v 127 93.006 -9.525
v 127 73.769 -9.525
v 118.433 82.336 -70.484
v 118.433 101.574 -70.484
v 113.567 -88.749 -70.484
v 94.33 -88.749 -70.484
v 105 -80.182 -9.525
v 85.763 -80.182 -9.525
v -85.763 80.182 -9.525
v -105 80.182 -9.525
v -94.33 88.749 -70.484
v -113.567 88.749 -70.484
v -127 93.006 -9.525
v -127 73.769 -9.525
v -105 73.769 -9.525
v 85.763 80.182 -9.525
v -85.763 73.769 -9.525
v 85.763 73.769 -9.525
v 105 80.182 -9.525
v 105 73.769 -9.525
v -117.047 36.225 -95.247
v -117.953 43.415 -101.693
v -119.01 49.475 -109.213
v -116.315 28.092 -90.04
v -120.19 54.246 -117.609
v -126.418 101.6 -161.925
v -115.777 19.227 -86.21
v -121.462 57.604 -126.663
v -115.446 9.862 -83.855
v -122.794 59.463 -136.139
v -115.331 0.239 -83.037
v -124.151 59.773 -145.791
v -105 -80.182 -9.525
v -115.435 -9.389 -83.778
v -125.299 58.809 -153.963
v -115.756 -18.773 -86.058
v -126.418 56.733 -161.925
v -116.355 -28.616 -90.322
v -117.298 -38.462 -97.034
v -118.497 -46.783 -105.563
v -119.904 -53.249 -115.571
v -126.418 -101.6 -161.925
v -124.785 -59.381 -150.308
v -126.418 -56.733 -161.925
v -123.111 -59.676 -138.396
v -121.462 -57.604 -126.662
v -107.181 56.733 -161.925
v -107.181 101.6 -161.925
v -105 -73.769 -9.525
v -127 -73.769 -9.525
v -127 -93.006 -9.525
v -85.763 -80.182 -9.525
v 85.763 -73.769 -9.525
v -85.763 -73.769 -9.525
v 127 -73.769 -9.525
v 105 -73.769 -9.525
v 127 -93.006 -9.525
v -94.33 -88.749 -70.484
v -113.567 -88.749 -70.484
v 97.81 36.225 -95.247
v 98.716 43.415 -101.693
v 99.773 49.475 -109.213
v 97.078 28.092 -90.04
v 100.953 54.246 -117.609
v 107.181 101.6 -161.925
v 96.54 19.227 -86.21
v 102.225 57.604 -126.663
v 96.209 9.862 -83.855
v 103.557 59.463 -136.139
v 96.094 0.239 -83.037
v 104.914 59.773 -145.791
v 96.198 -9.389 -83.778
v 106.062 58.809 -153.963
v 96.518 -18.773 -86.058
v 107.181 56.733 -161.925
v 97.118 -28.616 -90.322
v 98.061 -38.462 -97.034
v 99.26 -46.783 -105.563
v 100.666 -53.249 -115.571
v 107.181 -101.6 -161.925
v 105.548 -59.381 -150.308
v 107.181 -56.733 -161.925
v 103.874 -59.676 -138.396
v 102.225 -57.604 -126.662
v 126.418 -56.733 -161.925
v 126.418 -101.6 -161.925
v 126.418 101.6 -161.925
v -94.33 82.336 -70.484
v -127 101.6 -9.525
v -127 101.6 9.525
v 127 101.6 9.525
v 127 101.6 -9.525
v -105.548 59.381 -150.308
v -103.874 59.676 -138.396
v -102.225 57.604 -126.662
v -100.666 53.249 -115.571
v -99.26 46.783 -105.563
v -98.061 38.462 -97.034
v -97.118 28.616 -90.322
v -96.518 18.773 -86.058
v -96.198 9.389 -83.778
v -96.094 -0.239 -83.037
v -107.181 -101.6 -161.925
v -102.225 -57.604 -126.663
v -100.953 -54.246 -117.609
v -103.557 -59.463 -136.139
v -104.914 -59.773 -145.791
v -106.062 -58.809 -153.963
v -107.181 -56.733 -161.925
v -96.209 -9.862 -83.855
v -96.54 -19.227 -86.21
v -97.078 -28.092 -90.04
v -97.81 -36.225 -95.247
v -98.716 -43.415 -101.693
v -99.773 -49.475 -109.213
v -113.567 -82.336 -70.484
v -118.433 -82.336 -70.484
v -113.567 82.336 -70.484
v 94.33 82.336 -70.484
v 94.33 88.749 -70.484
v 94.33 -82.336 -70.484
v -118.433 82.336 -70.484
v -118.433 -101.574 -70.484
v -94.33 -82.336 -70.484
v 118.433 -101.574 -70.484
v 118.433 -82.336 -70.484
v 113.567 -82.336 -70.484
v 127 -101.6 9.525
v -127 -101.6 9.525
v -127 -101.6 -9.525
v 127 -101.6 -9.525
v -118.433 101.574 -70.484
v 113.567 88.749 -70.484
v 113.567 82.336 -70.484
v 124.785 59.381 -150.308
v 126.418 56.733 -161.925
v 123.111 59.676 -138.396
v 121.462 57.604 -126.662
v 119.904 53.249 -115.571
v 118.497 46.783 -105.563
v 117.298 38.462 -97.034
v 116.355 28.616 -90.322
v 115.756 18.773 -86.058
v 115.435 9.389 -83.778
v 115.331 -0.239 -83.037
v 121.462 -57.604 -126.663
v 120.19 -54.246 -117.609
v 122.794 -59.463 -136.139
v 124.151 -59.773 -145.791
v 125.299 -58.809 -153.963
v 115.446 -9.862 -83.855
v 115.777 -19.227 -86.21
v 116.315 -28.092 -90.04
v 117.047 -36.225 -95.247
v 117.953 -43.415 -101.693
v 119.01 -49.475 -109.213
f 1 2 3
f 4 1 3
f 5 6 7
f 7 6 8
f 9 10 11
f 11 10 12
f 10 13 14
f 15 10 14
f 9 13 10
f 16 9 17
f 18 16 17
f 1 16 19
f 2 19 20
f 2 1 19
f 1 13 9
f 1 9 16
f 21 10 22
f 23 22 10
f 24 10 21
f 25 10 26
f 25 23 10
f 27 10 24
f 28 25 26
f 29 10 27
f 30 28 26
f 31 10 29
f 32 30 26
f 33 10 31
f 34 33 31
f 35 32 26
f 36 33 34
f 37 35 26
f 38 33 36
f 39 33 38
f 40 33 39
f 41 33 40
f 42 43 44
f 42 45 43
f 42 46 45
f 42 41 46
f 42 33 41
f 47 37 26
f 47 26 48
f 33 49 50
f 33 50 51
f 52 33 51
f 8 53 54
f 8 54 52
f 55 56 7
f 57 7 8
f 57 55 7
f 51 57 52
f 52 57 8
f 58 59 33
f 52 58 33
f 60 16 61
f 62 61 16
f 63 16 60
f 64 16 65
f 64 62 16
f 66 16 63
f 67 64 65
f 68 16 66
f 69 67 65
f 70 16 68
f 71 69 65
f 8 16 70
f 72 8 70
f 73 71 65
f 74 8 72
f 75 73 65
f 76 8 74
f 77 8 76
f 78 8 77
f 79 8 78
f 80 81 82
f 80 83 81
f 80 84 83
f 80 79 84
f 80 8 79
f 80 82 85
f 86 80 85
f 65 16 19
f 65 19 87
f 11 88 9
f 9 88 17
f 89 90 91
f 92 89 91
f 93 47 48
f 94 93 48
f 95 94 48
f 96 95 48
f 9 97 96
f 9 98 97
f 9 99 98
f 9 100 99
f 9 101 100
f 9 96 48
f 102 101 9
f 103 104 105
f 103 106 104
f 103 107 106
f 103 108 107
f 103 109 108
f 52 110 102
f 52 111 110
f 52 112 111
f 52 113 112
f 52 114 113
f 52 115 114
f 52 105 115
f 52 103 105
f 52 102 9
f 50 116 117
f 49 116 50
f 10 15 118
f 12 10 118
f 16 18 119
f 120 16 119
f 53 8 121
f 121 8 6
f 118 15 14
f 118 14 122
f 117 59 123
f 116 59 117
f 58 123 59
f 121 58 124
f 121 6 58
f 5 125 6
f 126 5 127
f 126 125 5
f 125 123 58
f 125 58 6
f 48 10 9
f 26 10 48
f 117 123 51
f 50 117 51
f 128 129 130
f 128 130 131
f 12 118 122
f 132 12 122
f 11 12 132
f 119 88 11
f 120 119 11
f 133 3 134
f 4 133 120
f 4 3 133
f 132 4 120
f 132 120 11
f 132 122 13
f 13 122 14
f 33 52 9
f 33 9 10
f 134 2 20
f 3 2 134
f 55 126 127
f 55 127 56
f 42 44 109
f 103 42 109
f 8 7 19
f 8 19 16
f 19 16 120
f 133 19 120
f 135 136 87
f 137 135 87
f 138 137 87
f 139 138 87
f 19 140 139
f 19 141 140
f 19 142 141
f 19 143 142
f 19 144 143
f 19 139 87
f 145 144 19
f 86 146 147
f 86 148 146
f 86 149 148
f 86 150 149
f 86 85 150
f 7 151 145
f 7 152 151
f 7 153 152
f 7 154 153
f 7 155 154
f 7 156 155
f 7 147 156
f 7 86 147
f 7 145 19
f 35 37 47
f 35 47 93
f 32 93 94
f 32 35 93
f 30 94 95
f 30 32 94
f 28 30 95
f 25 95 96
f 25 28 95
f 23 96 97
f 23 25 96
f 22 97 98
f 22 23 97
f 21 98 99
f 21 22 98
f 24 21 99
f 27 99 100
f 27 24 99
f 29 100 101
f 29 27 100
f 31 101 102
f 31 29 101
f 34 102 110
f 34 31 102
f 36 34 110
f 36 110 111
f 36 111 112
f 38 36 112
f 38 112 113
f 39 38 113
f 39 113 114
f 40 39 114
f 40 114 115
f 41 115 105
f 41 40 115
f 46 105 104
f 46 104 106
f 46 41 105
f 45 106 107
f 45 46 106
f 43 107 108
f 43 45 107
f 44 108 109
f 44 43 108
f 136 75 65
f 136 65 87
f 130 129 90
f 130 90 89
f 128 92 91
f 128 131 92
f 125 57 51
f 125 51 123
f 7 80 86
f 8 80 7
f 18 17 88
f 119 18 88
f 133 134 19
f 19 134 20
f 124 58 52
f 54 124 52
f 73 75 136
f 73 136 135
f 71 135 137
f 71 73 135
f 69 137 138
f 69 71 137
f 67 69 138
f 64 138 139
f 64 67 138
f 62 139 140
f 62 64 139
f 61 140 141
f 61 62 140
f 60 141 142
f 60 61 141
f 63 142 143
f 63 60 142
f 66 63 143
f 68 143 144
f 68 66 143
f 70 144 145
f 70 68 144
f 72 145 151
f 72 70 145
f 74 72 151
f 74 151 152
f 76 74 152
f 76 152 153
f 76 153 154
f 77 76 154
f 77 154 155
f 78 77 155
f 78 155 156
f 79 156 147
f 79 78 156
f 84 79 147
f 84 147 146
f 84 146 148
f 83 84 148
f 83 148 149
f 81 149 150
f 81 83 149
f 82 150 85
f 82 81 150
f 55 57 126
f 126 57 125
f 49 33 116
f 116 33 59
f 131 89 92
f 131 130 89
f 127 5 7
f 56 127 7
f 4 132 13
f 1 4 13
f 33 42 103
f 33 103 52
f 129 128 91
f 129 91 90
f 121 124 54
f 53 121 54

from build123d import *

# Parameters (mm, degrees)
F1_DEPTH       = 101.6
F2_DEPTH       = 101.6
F2_DEPTH_BACK  = 101.6
F4_DEPTH       = 127.001
F4_DEPTH_BACK  = 127.001
F6_DEPTH       = 127
F9_DEPTH       = 127.001
F9_DEPTH_BACK  = 127.001
F10_DEPTH      = 101.6010000004
F10_DEPTH_BACK = 101.6010000004


# Not quite as in the source:
# - a feature names something its author has since deleted; it is built from what else it names


with BuildPart() as f1:
    # F0 (on Front) → F1 (new body, symmetric)
    with BuildSketch(Plane.XZ):
        Polygon((127, -9.525), (127, 9.525), (-127, 9.525), (-127, -9.525), (-104.9997227219, -9.525), (-85.7625074654, -9.525), (0, -9.525), (85.7625074654, -9.525), (104.9997227219, -9.525), align=None)
    extrude(amount=F1_DEPTH, both=True)


with BuildPart() as f2:
    # F0 (on Front) → F2 (new body, two sides)
    with BuildSketch(Plane.XZ) as f2_sk:
        Polygon((-94.3297724402, -70.4842578052), (-113.5669876967, -70.4842578052), (-126.4181459306, -161.925), (-107.1809306741, -161.925), align=None)
        Polygon((-85.7625074654, -9.525), (-104.9997227219, -9.525), (-113.5669876967, -70.4842578052), (-94.3297724402, -70.4842578052), align=None)
    extrude(amount=F2_DEPTH)
    extrude(f2_sk.sketch, amount=-F2_DEPTH_BACK)


with BuildPart() as f2b:
    # F0 (on Front) → F2, piece 2 (new body, two sides)
    with BuildSketch(Plane.XZ) as f2_2_sk:
        Polygon((113.5669876967, -70.4842578052), (104.9997227219, -9.525), (85.7625074654, -9.525), (94.3297724402, -70.4842578052), align=None)
        Polygon((126.4181459306, -161.925), (113.5669876967, -70.4842578052), (94.3297724402, -70.4842578052), (107.1809306741, -161.925), align=None)
    extrude(amount=F2_DEPTH)
    extrude(f2_2_sk.sketch, amount=-F2_DEPTH_BACK)


with BuildPart() as f4_tool:
    # F3 (on Right) → F4 (new body, two sides)
    with BuildSketch(Plane.YZ) as f4_sk:
        Polygon((-101.6000000004, -161.925), (-80.1815767917, -9.525), (-101.6000000004, -9.525), align=None)
        Polygon((101.5999999998, -161.925), (101.5999999997, -9.525), (80.1815767917, -9.525), align=None)
    extrude(amount=-F4_DEPTH)
    extrude(f4_sk.sketch, amount=F4_DEPTH_BACK)


with BuildPart() as f2_1:
    add(f2.part)

    # F4: cut by f4_tool
    add(f4_tool.part, mode=Mode.SUBTRACT)


with BuildPart() as f2b_1:
    add(f2b.part)

    # F4: cut by f4_tool
    add(f4_tool.part, mode=Mode.SUBTRACT)


with BuildPart() as f6:
    # F5 (on Right) → F6 (new body, symmetric)
    with BuildSketch(Plane.YZ):
        Polygon((80.1815767913, -9.525), (73.7691717062, -9.525), (82.336436681, -70.4842578052), (101.5736519375, -70.4842578052), (93.0063869627, -9.525), align=None)
    extrude(amount=F6_DEPTH, both=True)

    # F7: cut F2
    add(f2_1.part, mode=Mode.SUBTRACT)

    # F8: cut F2b
    add(f2b_1.part, mode=Mode.SUBTRACT)


with BuildPart() as f6b:
    # F5 (on Right) → F6, piece 2 (new body, symmetric)
    with BuildSketch(Plane.YZ):
        Polygon((-101.5736519375, -70.4842578052), (-82.336436681, -70.4842578052), (-73.7691717062, -9.525), (-80.1815767915, -9.525), (-93.0063869627, -9.525), align=None)
    extrude(amount=F6_DEPTH, both=True)

    # F7: cut F2
    add(f2_1.part, mode=Mode.SUBTRACT)

    # F8: cut F2b
    add(f2b_1.part, mode=Mode.SUBTRACT)


with BuildPart() as f9_tool:
    # F3 (on Right) → F9 (new body, two sides)
    with BuildSketch(Plane.YZ) as f9_sk:
        with BuildLine():
            Line((-56.7326918244, -161.925), (56.7326918244, -161.925))
            ThreePointArc((56.7326918244, -161.925), (0, -83.0369391017), (-56.7326918244, -161.925))
        make_face()
    extrude(amount=-F9_DEPTH)
    extrude(f9_sk.sketch, amount=F9_DEPTH_BACK)


with BuildPart() as f2_2:
    add(f2_1.part)

    # F9: cut by f9_tool
    add(f9_tool.part, mode=Mode.SUBTRACT)


with BuildPart() as f2b_2:
    add(f2b_1.part)

    # F9: cut by f9_tool
    add(f9_tool.part, mode=Mode.SUBTRACT)


with BuildPart() as f10_tool:
    # F0 (on Front) → F10 (new body, two sides)
    with BuildSketch(Plane.XZ) as f10_sk:
        Polygon((127, -70.4842578052), (127, -9.525), (118.4327350252, -70.4842578052), align=None)
        Polygon((-118.4327350252, -70.4842578052), (-127, -9.525), (-127, -70.4842578052), align=None)
    extrude(amount=F10_DEPTH)
    extrude(f10_sk.sketch, amount=-F10_DEPTH_BACK)


with BuildPart() as f6_1:
    add(f6.part)

    # F10: cut by f10_tool
    add(f10_tool.part, mode=Mode.SUBTRACT)


with BuildPart() as f6b_1:
    add(f6b.part)

    # F10: cut by f10_tool
    add(f10_tool.part, mode=Mode.SUBTRACT)


solid = Compound([f1.part, f2_2.part, f2b_2.part, f6_1.part, f6b_1.part])
